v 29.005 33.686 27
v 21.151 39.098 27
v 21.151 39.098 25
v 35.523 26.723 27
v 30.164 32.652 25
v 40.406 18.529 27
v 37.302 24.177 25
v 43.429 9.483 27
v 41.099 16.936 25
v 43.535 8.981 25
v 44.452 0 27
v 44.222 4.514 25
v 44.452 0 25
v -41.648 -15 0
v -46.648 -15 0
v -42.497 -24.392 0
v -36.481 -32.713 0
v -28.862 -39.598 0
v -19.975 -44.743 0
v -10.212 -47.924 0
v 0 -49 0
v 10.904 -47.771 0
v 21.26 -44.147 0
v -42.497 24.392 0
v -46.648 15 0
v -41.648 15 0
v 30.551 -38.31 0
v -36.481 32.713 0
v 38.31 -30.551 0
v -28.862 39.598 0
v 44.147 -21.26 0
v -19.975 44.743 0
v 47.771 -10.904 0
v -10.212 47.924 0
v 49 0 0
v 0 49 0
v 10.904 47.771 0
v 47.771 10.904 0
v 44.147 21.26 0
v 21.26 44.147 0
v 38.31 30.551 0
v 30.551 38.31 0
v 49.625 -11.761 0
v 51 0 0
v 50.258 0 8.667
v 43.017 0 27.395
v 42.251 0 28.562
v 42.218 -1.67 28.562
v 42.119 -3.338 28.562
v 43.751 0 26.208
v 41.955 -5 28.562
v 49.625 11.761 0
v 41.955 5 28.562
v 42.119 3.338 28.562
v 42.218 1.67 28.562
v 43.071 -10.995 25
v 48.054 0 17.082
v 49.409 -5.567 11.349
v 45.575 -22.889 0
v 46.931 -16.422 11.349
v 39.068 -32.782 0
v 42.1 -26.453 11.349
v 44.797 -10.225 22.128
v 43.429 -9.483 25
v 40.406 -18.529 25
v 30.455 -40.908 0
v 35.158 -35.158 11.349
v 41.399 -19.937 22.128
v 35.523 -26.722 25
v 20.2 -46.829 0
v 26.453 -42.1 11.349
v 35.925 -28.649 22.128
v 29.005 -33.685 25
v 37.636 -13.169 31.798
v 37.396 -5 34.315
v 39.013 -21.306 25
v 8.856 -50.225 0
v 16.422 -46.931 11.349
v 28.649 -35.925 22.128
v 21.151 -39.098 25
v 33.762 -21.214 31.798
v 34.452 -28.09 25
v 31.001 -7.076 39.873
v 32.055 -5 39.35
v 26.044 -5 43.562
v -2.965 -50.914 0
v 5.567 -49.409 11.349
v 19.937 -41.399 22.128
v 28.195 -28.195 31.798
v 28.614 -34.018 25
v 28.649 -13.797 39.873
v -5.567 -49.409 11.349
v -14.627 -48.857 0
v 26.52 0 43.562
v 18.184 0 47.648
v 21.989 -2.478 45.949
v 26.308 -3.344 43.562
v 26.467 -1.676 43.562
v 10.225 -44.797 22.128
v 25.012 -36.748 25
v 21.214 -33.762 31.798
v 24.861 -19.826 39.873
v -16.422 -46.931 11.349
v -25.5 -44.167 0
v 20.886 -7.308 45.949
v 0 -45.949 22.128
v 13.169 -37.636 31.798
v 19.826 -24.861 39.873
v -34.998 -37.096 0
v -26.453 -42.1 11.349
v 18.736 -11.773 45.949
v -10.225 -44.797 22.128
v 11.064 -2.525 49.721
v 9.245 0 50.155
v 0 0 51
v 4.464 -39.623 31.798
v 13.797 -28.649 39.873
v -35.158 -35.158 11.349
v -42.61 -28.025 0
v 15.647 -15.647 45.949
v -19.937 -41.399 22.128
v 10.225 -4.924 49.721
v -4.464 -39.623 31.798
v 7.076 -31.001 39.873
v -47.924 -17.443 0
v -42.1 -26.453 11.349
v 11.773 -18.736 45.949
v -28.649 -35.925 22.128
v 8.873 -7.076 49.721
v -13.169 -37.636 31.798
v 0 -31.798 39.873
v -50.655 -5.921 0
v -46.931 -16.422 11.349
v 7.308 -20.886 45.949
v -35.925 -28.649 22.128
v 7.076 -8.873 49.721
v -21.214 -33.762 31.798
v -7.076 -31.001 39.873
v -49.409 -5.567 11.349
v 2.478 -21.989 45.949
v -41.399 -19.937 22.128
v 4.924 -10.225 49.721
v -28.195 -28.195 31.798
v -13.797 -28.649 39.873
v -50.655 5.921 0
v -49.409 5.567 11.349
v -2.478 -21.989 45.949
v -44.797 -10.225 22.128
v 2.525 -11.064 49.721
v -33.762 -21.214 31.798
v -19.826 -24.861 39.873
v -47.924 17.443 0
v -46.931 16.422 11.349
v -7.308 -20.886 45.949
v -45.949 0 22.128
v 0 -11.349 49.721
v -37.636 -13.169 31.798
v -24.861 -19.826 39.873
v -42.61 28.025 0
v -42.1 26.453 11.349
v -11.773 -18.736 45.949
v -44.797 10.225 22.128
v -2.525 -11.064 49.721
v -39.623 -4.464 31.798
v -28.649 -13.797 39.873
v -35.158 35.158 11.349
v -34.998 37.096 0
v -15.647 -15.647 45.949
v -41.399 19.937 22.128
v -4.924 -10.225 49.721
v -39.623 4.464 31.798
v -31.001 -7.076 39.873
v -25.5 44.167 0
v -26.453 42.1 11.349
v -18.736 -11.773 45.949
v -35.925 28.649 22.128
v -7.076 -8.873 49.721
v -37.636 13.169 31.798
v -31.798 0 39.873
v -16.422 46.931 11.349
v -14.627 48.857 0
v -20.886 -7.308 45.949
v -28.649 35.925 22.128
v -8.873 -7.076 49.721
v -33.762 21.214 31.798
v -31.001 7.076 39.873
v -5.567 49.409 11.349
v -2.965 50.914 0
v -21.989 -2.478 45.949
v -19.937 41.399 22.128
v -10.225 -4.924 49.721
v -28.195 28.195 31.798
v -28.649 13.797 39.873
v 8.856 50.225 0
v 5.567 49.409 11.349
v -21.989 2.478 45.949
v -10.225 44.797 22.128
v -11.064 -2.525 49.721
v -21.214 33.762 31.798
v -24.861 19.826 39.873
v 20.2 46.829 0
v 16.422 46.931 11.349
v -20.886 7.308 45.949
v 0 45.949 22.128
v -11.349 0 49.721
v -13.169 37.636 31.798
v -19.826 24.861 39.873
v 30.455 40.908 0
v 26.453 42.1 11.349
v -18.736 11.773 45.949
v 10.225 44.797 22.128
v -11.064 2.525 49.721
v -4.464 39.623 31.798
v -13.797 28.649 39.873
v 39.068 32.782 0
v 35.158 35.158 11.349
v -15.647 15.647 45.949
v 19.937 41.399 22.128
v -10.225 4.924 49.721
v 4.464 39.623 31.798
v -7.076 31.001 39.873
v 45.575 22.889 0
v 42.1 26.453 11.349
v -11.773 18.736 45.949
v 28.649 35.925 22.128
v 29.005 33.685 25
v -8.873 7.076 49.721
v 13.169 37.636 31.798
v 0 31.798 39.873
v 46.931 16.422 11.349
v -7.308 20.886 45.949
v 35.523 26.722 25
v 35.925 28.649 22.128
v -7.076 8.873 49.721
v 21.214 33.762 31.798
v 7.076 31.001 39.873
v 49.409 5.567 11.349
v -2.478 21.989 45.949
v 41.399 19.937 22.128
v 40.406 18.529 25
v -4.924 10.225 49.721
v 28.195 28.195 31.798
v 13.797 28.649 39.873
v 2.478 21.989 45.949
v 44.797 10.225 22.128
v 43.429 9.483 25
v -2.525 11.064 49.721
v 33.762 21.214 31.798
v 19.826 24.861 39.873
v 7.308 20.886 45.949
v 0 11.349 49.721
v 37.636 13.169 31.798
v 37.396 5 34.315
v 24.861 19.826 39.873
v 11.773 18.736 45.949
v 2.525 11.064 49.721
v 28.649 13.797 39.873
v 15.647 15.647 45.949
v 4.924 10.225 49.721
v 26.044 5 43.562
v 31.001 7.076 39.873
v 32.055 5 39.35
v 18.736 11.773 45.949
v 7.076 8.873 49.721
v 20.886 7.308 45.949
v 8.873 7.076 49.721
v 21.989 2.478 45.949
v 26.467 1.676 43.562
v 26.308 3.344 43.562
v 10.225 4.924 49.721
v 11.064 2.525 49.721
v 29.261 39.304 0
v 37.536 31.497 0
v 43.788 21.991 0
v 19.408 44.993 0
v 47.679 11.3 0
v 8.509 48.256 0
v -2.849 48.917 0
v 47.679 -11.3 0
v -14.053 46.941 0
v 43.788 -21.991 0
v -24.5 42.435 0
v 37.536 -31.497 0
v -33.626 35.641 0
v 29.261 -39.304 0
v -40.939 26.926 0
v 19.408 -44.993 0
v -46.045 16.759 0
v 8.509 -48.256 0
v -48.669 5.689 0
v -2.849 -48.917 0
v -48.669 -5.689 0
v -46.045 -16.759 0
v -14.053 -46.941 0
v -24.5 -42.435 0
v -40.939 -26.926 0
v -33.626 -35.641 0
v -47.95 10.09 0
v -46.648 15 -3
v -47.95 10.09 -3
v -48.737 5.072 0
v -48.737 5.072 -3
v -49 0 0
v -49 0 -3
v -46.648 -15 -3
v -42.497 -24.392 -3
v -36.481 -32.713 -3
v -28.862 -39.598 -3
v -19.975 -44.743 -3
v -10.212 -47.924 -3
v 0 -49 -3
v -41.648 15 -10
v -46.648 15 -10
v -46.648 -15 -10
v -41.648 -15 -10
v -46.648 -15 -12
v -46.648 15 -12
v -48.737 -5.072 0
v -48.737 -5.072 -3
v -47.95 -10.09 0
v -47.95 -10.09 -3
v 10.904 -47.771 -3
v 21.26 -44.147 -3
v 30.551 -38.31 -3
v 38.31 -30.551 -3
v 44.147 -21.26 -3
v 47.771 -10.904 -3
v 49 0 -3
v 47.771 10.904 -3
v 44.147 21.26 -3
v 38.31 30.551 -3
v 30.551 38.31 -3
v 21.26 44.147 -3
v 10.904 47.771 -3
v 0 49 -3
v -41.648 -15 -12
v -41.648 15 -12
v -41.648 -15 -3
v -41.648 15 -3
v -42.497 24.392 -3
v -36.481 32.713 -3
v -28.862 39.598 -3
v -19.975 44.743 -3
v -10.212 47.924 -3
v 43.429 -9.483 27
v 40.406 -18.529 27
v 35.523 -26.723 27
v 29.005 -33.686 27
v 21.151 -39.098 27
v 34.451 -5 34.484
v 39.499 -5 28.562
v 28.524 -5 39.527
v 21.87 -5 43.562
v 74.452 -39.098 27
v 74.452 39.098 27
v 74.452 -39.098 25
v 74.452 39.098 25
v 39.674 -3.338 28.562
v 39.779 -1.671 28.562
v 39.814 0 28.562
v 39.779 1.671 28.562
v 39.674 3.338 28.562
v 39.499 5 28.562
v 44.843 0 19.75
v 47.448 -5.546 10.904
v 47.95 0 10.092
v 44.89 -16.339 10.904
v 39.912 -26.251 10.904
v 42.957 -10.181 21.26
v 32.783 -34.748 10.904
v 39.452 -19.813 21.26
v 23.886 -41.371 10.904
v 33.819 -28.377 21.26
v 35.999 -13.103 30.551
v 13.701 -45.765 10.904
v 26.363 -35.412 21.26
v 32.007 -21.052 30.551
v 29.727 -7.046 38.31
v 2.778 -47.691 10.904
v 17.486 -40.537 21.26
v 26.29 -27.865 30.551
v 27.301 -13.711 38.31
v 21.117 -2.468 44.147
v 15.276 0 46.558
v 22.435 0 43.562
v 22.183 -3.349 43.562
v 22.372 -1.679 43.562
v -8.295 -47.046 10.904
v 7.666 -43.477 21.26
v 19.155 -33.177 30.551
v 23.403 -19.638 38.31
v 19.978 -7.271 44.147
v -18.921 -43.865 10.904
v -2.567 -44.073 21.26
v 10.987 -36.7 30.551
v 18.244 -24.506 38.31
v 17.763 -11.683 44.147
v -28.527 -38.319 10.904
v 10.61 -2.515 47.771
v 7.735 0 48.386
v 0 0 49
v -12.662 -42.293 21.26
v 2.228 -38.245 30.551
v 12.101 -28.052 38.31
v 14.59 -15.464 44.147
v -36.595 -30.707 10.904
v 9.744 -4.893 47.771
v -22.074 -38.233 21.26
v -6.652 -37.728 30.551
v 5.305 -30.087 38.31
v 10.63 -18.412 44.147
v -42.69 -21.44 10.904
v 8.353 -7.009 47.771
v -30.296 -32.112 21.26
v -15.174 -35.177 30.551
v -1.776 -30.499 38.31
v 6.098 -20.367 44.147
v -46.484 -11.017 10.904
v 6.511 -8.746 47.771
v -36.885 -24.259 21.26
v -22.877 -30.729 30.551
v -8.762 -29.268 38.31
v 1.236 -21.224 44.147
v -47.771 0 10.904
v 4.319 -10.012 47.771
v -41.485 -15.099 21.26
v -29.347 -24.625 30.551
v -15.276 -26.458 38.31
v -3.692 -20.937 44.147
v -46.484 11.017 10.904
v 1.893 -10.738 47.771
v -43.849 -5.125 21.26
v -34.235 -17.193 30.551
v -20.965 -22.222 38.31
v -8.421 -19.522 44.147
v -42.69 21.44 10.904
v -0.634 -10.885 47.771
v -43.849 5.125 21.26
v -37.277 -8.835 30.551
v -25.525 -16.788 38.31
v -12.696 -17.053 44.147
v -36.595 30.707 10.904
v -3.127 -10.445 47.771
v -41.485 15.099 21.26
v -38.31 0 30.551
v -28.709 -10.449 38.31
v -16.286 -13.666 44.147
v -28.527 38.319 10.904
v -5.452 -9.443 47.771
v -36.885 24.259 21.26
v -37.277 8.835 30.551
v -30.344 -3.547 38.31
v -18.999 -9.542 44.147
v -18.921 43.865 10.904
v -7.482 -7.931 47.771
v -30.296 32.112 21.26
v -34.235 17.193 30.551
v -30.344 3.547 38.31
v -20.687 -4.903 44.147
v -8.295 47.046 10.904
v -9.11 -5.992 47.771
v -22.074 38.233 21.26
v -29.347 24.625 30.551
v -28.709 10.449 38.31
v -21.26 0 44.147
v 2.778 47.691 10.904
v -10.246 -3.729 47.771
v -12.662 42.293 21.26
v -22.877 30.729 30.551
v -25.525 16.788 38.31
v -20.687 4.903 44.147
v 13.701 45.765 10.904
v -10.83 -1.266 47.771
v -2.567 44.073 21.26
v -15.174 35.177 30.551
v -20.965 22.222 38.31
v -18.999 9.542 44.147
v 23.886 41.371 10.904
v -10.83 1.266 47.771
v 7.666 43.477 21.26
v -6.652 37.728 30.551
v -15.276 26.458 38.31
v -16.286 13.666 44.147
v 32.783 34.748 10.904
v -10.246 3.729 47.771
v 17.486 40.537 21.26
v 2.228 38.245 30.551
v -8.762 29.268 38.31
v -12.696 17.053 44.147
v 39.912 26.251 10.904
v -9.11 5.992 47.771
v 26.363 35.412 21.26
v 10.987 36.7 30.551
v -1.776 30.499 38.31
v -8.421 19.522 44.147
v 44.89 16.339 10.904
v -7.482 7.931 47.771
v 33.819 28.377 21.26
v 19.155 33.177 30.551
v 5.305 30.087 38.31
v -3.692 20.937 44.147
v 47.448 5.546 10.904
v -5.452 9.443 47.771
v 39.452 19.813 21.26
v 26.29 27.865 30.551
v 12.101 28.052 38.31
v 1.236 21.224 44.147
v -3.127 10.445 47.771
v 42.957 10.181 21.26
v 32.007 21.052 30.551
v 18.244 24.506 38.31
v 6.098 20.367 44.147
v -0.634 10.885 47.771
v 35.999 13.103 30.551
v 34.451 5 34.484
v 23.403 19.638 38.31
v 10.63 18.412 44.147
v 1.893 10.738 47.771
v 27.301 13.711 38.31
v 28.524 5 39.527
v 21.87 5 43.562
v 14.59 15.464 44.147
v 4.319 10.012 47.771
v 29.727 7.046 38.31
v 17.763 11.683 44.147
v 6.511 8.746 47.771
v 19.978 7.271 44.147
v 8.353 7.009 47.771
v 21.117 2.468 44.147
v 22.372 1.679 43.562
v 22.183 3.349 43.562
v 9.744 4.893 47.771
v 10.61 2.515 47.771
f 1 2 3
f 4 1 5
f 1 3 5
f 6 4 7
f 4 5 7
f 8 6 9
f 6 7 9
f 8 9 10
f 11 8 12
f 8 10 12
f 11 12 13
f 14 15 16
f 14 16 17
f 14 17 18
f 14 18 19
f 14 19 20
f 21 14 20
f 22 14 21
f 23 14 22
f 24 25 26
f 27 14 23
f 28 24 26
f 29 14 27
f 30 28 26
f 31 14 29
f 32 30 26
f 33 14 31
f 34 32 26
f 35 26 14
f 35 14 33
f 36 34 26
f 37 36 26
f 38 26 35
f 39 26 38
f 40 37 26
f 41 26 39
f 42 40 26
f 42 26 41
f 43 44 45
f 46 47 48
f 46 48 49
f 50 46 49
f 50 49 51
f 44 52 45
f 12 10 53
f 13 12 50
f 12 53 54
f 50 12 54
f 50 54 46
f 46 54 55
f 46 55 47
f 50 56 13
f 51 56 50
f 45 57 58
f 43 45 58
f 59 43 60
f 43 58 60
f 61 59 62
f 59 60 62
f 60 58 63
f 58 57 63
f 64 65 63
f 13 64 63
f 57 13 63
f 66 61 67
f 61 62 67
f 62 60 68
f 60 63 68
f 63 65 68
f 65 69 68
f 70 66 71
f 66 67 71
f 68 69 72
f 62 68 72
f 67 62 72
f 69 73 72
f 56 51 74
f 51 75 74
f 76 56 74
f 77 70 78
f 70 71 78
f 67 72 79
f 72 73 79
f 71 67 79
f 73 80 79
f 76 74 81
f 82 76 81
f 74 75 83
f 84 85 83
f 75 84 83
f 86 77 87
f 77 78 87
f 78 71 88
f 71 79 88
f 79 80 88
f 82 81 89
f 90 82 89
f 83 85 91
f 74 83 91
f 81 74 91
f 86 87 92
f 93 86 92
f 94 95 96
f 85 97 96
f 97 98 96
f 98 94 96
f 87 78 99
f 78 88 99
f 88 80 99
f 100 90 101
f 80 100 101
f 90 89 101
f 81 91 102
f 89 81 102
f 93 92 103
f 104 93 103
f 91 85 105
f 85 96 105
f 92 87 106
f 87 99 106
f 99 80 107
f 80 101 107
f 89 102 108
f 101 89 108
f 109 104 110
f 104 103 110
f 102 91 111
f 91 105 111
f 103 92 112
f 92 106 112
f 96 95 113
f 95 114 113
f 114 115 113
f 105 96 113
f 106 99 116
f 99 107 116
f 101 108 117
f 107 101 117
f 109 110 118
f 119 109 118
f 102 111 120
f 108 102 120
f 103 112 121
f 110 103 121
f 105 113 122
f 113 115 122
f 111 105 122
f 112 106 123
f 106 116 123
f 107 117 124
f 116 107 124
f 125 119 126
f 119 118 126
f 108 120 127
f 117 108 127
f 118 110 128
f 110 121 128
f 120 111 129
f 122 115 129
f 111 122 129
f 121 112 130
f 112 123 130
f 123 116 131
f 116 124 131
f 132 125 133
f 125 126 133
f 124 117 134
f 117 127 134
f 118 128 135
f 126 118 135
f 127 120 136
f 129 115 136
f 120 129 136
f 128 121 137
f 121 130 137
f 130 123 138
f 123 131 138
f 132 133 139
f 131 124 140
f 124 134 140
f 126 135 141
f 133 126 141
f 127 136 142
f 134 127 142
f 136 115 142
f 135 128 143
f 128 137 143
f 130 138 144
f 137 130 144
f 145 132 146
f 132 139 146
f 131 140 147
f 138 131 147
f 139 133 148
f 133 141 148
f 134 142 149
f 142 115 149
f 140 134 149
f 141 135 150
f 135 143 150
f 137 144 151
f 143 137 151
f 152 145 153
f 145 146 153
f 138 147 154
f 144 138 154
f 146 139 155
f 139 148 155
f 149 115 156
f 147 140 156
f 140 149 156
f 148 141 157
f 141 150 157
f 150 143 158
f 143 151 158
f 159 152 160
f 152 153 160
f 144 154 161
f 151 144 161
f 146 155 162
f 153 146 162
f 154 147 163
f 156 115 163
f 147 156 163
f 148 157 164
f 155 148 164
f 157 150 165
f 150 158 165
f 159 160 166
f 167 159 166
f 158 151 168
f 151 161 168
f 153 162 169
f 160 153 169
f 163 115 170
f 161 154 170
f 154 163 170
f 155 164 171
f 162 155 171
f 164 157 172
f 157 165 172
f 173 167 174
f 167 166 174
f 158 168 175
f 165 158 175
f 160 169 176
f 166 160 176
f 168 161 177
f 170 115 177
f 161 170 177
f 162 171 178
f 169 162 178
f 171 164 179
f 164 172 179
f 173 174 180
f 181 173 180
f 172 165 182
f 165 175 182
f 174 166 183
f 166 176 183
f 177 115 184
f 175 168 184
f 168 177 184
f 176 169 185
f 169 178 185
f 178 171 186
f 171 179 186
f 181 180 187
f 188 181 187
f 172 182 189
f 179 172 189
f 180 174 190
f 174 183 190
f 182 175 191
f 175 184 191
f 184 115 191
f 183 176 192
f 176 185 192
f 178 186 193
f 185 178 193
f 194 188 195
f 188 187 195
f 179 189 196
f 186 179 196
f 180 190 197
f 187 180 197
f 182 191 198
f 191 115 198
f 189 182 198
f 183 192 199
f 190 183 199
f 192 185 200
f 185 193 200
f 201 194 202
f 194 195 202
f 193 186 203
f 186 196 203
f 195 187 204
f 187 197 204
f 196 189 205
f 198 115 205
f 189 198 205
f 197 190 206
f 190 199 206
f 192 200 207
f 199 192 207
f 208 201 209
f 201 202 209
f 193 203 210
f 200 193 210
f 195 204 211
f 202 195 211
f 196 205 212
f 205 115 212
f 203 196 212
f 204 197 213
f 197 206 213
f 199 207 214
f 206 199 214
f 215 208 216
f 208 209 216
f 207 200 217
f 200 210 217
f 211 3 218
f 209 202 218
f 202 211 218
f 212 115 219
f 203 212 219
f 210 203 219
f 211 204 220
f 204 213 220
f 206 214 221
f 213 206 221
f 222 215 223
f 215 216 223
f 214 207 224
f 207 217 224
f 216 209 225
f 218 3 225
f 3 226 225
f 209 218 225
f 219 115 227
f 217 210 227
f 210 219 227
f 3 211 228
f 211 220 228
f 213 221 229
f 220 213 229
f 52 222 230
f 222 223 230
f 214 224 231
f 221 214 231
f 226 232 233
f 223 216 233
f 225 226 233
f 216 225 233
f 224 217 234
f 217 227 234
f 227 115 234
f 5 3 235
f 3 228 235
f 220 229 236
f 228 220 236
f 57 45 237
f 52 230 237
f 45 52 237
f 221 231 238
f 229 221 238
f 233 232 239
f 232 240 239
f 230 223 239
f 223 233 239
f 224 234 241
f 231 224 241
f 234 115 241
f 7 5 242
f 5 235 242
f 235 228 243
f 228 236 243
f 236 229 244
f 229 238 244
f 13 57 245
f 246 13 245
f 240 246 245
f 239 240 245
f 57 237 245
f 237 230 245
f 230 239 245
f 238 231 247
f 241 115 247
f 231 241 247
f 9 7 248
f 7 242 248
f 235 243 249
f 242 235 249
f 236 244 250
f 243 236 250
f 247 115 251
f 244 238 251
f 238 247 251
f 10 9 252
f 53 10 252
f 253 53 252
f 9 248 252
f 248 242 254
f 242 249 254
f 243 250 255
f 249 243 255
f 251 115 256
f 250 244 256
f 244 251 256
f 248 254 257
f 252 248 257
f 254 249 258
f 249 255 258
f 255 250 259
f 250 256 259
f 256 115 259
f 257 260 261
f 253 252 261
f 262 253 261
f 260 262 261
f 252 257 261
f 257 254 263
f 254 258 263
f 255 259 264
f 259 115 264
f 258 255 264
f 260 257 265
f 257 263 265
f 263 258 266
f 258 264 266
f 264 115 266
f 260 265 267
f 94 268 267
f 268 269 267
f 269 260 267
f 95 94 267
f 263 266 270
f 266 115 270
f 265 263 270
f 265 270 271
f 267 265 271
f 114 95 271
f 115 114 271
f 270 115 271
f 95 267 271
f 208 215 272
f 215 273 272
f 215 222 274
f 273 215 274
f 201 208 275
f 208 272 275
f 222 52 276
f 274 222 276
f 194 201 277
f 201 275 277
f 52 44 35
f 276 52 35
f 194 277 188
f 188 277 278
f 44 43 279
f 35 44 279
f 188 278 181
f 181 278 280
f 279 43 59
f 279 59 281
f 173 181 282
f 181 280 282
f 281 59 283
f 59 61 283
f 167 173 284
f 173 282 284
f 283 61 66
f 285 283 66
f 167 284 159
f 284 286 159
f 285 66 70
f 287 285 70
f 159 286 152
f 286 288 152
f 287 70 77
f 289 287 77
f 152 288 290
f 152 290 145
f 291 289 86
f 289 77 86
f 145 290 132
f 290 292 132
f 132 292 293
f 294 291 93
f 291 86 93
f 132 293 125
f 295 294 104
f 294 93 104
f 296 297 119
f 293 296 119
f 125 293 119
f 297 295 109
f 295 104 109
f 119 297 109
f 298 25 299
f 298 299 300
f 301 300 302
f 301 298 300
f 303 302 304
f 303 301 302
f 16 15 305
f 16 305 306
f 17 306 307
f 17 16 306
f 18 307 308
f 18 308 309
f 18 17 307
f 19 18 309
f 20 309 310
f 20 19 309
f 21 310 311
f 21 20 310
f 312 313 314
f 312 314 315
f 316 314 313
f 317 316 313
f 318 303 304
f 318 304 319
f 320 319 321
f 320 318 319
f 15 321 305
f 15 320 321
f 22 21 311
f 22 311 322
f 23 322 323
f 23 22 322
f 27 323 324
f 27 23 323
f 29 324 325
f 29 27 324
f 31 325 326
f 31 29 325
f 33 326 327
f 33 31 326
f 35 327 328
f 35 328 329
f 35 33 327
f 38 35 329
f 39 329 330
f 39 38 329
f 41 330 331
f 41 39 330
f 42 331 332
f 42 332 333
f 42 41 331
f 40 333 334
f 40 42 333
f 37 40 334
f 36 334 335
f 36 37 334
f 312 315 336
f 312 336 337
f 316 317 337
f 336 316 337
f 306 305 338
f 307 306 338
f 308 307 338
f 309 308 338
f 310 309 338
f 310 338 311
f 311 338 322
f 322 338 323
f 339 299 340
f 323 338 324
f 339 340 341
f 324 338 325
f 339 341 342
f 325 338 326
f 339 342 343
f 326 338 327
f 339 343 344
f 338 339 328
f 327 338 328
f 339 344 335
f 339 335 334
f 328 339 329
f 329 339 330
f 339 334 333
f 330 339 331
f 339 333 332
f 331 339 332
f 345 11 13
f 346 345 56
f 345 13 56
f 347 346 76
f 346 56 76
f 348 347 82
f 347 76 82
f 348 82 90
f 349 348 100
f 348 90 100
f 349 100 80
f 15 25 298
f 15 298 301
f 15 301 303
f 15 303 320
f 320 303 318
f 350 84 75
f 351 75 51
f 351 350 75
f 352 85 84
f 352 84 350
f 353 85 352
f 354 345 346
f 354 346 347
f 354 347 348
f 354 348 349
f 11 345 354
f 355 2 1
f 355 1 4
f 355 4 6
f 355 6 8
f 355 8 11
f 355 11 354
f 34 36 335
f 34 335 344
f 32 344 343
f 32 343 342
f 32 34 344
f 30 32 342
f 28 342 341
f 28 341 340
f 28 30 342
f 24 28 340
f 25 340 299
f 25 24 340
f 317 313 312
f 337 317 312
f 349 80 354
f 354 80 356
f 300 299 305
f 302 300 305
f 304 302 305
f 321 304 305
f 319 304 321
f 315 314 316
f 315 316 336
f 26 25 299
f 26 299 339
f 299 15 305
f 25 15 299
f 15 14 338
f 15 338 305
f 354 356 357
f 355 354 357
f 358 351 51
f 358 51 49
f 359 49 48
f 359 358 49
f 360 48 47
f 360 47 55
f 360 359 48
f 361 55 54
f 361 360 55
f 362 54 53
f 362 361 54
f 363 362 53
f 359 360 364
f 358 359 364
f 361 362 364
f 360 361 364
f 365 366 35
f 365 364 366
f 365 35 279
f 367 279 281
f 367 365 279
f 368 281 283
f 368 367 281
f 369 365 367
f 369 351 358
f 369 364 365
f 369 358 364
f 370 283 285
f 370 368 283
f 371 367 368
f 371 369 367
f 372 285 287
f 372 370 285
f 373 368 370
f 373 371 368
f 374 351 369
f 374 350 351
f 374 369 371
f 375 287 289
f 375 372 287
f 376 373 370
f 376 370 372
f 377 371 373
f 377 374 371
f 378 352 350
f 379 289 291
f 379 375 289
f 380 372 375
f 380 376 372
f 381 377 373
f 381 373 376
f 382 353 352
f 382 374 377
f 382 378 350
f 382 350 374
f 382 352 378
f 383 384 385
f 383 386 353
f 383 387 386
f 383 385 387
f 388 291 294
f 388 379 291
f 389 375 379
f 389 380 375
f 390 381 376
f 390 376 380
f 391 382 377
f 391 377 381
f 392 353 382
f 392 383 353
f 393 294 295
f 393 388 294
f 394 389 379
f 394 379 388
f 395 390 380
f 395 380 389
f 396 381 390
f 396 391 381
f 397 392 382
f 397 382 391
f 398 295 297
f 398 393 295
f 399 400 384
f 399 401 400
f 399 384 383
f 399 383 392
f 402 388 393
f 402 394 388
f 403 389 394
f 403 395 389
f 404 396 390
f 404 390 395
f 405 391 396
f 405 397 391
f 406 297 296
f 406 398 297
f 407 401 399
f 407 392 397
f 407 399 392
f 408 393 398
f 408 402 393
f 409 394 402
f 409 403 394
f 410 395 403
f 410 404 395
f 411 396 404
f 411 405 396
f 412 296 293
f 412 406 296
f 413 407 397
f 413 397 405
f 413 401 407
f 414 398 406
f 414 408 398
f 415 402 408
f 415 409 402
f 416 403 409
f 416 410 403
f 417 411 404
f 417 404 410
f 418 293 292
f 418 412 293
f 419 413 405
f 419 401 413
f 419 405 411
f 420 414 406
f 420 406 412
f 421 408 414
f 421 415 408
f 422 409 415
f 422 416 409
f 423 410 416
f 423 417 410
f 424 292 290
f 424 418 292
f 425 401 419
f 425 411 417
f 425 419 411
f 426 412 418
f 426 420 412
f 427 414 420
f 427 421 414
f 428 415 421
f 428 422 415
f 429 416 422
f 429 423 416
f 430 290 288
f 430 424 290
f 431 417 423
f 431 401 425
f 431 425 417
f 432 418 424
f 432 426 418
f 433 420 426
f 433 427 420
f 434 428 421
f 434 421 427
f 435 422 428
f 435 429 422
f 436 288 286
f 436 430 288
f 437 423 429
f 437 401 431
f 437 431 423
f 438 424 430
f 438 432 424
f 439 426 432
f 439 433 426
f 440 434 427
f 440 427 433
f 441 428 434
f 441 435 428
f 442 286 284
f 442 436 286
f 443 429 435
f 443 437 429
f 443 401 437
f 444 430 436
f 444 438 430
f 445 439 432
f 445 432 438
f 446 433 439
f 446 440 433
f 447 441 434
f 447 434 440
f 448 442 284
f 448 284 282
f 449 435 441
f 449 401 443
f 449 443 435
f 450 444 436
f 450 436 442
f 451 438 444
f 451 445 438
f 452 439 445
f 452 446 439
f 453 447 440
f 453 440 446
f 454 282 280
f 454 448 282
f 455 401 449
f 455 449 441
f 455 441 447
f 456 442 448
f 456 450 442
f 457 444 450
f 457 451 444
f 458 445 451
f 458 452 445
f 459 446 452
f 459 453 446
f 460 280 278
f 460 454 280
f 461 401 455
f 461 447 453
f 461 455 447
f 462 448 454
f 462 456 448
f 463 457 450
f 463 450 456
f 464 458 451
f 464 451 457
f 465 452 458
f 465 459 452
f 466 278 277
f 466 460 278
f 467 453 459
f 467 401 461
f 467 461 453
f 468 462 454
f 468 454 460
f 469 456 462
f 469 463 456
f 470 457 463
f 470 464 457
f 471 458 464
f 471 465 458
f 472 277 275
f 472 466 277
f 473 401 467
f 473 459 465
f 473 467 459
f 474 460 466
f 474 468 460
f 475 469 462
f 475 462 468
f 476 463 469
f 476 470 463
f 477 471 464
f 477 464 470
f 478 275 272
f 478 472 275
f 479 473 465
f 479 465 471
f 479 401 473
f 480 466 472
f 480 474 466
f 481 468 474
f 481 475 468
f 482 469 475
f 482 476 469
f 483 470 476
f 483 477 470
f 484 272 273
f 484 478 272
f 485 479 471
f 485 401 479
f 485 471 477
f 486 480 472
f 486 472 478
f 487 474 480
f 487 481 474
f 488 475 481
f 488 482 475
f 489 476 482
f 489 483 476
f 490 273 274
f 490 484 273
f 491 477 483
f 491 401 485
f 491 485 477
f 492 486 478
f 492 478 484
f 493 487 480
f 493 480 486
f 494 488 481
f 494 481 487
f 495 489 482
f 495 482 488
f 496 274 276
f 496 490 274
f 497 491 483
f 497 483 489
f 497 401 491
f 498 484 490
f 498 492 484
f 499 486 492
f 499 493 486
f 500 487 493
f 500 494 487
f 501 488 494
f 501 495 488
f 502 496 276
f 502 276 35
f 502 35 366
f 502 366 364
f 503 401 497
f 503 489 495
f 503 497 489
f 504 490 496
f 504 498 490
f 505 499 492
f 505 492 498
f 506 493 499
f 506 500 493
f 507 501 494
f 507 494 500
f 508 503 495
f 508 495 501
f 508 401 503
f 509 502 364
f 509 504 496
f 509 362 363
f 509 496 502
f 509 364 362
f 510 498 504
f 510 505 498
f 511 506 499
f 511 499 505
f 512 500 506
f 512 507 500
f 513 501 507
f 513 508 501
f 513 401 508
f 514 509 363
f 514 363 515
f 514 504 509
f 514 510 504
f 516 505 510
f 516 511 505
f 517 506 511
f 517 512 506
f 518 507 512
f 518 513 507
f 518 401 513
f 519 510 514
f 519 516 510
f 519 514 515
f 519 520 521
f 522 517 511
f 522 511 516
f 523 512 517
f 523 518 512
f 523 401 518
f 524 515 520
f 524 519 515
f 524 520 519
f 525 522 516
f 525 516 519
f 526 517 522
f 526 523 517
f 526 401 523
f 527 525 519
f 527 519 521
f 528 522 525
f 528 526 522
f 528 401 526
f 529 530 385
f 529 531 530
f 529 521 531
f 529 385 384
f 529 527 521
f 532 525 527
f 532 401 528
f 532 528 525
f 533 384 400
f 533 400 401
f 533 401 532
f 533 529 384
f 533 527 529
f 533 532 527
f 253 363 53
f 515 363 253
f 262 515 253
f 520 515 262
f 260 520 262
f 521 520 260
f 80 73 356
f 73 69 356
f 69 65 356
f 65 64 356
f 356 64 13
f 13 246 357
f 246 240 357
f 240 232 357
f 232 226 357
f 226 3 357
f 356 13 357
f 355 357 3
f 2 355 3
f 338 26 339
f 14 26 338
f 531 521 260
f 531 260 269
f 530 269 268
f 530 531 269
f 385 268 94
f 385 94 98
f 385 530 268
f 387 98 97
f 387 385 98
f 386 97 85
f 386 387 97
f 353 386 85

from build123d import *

# Parameters (mm, degrees)
F7_DEPTH  = 2
F10_DEPTH = 64.1
F12_DEPTH = 3
F15_W     = 5
F15_H     = 30
F16_DEPTH = 2


# Not quite as in the source:
# - the program builds the solid bodies; features that only make, move or delete a surface that nothing else refers to are left out


with BuildPart() as f1:
    # F0 (on Front) → F1 (revolve)
    with BuildSketch(Plane.XZ):
        with BuildLine():
            Line((0, 0), (51, 0))
            ThreePointArc((51, 0), (36.0624458405, 36.0624458405), (0, 51))
            Line((0, 51), (0, 0))
        make_face()
    revolve(axis=Axis((0, 0, 25.5), (0, 0, -1)))

    # F2 (on Front) → F3 (revolve, cut)
    with BuildSketch(Plane.XZ):
        with BuildLine():
            Line((0, 0), (49, 0))
            ThreePointArc((49, 0), (34.6482322781, 34.6482322781), (0, 49))
            Line((0, 49), (0, 0))
        make_face()
    revolve(axis=Axis((0, 0, 24.5), (0, 0, -1)), mode=Mode.SUBTRACT)

    # F6 (on offset) → F7 (join)
    with BuildSketch(Plane.XY.offset(25)):
        with BuildLine():
            ThreePointArc((44.452, 0), (38.1849042827, -22.757271122), (21.1507587097, -39.0976432794))
            Line((21.1507587097, -39.0976432794), (74.452, -39.0976432794))
            Line((74.452, -39.0976432794), (74.452, 0))
            Line((74.452, 0), (44.452, 0))
        make_face()
        with BuildLine():
            ThreePointArc((21.1507587097, 39.0976432794), (38.1849042827, 22.757271122), (44.452, 0))
            Line((44.452, 0), (74.452, 0))
            Line((74.452, 0), (74.452, 39.097645))
            Line((74.452, 39.097645), (21.1507587097, 39.0976432794))
        make_face()
    extrude(amount=F7_DEPTH)

    # F9 (on Right) → F10 (cut)
    with BuildSketch(Plane.YZ):
        Polygon((5, 36.0624458633), (0, 36.0624458633), (-5, 36.0624458633), (-5, 28.5624458633), (5, 28.5624458633), align=None)
        Polygon((-5, 36.0624458633), (0, 36.0624458633), (5, 36.0624458633), (5, 43.5624458633), (0, 43.5624458633), (-5, 43.5624458633), align=None)
    extrude(amount=F10_DEPTH, mode=Mode.SUBTRACT)


with BuildPart() as f12:
    # F11 (on Top) → F12 (new body)
    with BuildSketch(Plane.XY):
        with BuildLine():
            Line((-41.6476151588, 15), (-41.6476151588, 0))
            Line((-41.6476151588, 0), (-41.6476151588, -15))
            Line((-41.6476151588, -15), (-46.6476151588, -15))
            ThreePointArc((-46.6476151588, -15), (-28.8617393793, -39.5979797464), (0, -49))
            ThreePointArc((0, -49), (49, 0), (0, 49))
            ThreePointArc((0, 49), (-28.8617393793, 39.5979797464), (-46.6476151588, 15))
            Line((-46.6476151588, 15), (-41.6476151588, 15))
        make_face()
    extrude(amount=-F12_DEPTH)


with BuildPart() as f12b:
    # F11 (on Top) → F12, piece 2 (new body)
    with BuildSketch(Plane.XY):
        with BuildLine():
            Line((-46.6476151588, -15), (-46.6476151588, 0))
            Line((-46.6476151588, 0), (-49, 0))
            ThreePointArc((-49, 0), (-48.408331632, -7.591668368), (-46.6476151588, -15))
        make_face()
        with BuildLine():
            Line((-49, 0), (-46.6476151588, 0))
            Line((-46.6476151588, 0), (-46.6476151588, 15))
            ThreePointArc((-46.6476151588, 15), (-48.408331632, 7.591668368), (-49, 0))
        make_face()
    extrude(amount=-F12_DEPTH)


with BuildPart() as f16:
    # F15 (on offset) → F16 (new body)
    with BuildSketch(Plane.XY.offset(-10)):
        with Locations((-44.1476151588, 0)):
            Rectangle(F15_W, F15_H)
    extrude(amount=-F16_DEPTH)


solid = Compound([f1.part, f12.part, f12b.part, f16.part])
